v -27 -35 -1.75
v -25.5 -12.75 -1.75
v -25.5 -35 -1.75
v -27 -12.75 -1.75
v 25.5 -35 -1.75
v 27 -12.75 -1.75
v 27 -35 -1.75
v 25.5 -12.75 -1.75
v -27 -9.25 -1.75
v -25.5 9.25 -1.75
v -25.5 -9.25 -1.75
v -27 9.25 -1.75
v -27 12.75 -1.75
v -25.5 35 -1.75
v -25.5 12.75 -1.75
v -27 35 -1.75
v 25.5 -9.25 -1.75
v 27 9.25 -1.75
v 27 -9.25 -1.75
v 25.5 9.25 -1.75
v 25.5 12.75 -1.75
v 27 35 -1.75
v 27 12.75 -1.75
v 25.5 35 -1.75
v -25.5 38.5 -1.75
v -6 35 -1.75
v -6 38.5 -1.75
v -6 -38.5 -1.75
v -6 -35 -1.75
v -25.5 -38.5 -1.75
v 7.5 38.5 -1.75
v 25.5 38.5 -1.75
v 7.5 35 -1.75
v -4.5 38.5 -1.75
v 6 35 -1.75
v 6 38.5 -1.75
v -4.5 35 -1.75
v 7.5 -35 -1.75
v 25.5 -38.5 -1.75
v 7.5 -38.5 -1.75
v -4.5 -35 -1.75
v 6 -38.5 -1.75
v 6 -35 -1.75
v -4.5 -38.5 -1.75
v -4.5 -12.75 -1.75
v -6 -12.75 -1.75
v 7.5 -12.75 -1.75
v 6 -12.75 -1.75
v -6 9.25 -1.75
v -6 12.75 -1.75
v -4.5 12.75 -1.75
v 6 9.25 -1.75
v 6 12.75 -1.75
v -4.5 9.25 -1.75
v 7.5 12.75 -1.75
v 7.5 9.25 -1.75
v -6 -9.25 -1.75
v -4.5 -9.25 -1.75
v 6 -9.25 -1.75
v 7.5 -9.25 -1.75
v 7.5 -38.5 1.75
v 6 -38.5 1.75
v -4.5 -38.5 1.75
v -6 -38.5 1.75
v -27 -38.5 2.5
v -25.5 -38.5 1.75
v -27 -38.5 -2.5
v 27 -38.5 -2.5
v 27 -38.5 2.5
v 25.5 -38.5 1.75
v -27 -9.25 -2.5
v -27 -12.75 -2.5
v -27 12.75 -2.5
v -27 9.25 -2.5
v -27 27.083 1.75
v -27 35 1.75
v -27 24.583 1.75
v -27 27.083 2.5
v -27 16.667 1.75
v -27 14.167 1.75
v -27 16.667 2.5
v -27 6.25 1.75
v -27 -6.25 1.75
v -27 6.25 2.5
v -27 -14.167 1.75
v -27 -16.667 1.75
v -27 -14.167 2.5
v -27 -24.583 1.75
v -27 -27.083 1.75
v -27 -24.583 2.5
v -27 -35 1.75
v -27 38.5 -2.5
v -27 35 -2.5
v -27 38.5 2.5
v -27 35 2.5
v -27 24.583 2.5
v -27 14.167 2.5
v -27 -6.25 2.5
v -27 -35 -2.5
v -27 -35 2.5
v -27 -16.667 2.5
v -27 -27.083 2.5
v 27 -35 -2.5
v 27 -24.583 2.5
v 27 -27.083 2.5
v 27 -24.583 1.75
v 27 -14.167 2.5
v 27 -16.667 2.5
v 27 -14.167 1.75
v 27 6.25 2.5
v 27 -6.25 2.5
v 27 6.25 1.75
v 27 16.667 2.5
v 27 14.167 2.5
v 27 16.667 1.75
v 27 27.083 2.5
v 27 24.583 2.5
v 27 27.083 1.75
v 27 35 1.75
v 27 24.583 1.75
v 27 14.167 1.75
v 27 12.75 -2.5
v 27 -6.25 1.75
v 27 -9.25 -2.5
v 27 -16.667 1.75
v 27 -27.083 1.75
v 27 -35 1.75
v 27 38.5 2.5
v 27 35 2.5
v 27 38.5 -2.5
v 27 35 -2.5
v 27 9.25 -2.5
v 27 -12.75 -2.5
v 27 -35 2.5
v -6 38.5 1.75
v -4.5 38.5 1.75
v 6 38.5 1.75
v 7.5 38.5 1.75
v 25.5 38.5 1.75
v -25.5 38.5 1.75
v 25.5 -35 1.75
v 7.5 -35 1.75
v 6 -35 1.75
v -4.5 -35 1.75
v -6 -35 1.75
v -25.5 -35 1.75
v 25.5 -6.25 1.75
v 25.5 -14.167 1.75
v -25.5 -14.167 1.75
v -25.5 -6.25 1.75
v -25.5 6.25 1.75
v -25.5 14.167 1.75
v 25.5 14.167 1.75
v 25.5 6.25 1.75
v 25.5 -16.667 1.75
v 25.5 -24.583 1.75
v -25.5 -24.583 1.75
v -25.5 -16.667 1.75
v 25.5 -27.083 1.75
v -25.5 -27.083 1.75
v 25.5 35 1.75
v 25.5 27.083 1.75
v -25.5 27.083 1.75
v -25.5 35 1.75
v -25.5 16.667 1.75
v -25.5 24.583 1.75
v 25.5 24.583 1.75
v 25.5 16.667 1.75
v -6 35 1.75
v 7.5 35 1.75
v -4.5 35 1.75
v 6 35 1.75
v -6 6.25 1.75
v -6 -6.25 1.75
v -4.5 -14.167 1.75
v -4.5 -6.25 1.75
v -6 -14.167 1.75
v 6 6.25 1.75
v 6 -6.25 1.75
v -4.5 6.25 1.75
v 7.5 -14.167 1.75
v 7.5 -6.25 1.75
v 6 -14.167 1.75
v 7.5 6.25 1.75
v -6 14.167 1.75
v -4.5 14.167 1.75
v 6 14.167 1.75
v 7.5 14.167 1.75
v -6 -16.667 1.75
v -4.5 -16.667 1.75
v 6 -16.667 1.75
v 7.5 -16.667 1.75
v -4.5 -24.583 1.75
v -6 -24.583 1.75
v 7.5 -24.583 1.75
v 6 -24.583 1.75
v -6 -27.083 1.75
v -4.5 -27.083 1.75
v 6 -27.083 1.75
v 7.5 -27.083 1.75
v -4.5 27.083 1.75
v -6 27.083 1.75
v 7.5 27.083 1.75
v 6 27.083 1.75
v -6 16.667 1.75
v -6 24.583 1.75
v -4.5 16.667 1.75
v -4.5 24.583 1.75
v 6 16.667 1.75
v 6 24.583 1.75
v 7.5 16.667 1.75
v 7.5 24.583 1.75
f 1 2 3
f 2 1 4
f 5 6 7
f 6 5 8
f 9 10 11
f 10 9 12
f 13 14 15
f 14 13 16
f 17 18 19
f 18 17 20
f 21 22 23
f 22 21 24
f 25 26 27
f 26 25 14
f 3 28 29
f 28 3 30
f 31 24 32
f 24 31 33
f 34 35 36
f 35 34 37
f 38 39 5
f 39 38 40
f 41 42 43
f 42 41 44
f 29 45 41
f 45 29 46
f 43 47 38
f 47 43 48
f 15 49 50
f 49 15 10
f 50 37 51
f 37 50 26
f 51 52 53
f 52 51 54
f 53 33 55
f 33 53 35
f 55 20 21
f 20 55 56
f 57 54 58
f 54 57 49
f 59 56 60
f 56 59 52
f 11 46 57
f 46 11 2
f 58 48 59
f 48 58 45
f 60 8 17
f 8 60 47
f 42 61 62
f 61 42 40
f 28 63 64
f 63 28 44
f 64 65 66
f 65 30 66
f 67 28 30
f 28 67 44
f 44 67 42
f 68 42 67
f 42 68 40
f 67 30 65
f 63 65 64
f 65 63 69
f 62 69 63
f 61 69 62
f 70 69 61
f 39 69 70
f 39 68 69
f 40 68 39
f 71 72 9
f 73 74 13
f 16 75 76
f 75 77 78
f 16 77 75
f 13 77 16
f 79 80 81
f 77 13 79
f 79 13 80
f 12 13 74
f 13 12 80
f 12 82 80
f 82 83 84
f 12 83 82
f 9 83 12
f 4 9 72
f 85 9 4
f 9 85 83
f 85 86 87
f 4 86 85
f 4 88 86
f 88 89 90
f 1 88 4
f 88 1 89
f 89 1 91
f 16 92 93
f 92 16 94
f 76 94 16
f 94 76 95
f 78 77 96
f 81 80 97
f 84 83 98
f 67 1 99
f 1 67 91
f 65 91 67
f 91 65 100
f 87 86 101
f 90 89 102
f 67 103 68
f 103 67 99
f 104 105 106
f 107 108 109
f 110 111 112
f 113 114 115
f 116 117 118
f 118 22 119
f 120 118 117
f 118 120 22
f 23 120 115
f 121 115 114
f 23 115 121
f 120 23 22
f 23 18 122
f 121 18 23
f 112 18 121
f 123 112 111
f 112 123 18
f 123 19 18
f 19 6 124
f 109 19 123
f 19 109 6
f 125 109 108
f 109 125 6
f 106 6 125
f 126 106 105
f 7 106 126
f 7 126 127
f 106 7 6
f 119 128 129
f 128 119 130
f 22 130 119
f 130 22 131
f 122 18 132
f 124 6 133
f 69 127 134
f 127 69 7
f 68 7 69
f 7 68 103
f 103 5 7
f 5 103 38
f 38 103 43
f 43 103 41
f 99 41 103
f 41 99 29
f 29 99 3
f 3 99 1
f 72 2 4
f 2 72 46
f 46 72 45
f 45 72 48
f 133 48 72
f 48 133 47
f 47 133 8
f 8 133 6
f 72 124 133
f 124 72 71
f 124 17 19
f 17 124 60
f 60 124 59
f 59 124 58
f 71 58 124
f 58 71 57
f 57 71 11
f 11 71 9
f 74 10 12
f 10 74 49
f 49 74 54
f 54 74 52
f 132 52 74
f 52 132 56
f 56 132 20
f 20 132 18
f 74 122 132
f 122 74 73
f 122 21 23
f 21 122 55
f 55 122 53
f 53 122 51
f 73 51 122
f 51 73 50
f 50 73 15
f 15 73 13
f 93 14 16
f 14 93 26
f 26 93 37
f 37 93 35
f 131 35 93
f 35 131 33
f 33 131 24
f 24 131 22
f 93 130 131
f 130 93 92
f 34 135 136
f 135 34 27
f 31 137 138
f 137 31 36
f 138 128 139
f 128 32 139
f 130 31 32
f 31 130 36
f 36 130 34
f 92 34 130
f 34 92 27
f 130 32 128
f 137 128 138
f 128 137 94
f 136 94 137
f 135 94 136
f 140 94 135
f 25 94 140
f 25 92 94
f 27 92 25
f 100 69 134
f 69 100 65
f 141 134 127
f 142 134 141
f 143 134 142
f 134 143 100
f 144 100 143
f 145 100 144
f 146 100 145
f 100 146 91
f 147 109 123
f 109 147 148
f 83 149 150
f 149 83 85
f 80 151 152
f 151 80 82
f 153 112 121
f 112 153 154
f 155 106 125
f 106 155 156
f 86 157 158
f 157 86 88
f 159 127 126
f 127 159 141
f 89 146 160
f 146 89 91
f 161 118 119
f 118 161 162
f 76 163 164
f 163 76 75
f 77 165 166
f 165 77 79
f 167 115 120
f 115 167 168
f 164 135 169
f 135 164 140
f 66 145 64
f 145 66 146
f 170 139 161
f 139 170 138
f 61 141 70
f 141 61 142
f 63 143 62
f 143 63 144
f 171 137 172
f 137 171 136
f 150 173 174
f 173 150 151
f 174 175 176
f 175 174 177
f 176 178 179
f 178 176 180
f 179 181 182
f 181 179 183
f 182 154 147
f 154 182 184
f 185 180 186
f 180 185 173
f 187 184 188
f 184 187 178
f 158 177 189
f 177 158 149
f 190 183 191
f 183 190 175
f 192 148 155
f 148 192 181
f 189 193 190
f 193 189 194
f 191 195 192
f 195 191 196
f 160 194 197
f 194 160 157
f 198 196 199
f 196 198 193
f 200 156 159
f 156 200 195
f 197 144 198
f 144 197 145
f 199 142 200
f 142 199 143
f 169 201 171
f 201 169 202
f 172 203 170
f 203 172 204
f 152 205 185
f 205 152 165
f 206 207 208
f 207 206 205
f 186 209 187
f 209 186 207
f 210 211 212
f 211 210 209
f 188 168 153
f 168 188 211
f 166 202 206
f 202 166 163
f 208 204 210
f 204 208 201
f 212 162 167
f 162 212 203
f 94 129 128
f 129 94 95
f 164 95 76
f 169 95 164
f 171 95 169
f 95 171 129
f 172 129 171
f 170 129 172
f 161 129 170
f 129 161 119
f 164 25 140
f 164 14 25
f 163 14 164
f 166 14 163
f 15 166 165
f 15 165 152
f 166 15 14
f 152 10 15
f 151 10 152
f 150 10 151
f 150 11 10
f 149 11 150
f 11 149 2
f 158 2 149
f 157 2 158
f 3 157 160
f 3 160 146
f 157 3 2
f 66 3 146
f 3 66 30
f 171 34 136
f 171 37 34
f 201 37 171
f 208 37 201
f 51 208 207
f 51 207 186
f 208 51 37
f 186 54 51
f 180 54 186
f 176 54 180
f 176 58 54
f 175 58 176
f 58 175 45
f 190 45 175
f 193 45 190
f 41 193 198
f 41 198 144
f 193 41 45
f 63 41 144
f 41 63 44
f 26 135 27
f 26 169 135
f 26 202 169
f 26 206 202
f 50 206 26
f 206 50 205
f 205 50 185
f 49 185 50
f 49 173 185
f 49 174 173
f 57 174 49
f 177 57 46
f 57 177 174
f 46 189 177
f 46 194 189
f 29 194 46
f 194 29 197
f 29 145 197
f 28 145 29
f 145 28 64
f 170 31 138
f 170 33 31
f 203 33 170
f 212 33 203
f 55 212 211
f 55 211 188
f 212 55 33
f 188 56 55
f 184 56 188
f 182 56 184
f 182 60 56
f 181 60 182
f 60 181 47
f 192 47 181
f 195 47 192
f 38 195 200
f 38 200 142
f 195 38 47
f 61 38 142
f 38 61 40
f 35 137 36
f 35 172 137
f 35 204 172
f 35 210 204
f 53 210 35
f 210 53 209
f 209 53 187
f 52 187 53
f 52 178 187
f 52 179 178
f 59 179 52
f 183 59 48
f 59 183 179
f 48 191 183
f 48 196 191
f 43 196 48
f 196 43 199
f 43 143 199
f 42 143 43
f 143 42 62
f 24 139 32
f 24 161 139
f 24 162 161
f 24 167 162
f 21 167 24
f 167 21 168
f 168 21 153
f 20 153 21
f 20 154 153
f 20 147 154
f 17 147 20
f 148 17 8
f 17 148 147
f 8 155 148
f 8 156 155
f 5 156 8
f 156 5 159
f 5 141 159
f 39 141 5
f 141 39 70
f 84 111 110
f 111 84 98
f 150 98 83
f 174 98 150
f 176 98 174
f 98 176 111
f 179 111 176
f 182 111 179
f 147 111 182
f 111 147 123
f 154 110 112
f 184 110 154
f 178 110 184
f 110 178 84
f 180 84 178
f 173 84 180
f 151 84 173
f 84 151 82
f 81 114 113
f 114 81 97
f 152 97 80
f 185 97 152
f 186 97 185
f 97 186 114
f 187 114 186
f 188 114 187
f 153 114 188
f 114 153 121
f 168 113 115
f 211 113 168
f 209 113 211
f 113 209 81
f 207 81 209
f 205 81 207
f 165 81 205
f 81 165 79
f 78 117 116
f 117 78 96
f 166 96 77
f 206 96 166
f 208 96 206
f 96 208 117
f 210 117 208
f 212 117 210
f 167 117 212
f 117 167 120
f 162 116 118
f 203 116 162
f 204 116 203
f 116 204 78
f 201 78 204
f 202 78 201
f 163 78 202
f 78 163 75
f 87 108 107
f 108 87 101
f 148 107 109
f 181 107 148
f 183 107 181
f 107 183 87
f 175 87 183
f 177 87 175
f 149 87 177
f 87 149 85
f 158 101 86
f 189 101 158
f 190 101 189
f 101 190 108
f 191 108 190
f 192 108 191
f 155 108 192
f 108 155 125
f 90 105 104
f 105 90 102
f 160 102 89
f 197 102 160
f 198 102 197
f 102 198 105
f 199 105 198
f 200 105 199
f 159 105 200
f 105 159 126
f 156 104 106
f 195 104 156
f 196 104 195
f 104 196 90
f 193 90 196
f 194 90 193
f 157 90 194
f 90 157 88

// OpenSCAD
// file: materials.scad
// General Materials List for part Dimmentions
//  These form the matrial requirements for Deseret Manufacturing's homemade pallets

// Define Rails as 2x4 boards
Rails_W = 3.5; // 4
Rails_T = 1.5; // 2

// Define Frames as 1x4 boards
Frame_W = 3.5; // 4
Frame_T = 0.75; // 1

// Define Ties as 1x3 boards
Tie_W = 2.5; // 3
Tie_T = Frame_T; // same thickness as Frames

// These are the real sizes of the board and are used in calulations and rendering
// file: Pallet.scad
// Generic Pallet Module

include <materials.scad>

module Pallet(length, width, center) {
	// Define parts
	Rails = [Rails_W, length, Rails_T];
	Frame = [Frame_W, width, Frame_T];
	Tie = [Tie_W, width, Frame_T];

	// Place Foundation
	//  The end-to-end constant 29.25 is used because in the pallets I have made I can find no edge-cases that would need to alter it and I lack sufficient data on pallet jacks to automaticly place them.
	foundation_pos = [0, 29.25 - Frame_W, length - 29.25, length - Frame_W];

	for( pos = foundation_pos ) {
		rotate([0,0,90]) translate([pos - length / 2, - width / 2, - (Rails_W / 2) - Frame_T]) cube(Frame);
	}

	for( pos = [0, length - Frame_W] ) {
		rotate([0,0,90]) translate([pos - length / 2, - width / 2, Rails_W /2]) cube(Frame);
	}

	// Place Rails
	//  The end-to-end constant for the space between the two middle rails is 13.5
	//  Again I lack sufficient data on pallet jacks to automaticly place them.
	
	rail_spaces = (width - 13.5 + Rails_T) / 2;

	rail_pos = [0, rail_spaces, width - rail_spaces, width - Rails_T];

	for( pos = rail_pos ) {
		translate([pos - width /2 , -length /2 ,Rails_W /2]) rotate([0,90,0]) cube(Rails);
	}

	// Place Ties
	//  Ties form the main face of the pallet
   //  In this design, a centeral cluster of ties is used to reinforce the middle of the pallet
	pallet_center = length / 2;
	cluster_center = (center * Tie_W) / 2 + Tie_W;
	function cluster_pos_gen(ittr) = pallet_center - cluster_center + (ittr * Tie_W);
	cluster_pos = [ for(i=[1:center]) cluster_pos_gen(i) ];
    for( pos = cluster_pos ){
        rotate([0,0,90]) translate([pos - length / 2, - width / 2, Rails_W /2]) cube(Tie);
    }
    
    target_space = 8;
    tie_count = ceil((length - ( center * Tie_W + 2 * ( Frame_W + target_space ))) / (Tie_W + target_space ) / 2) * 2;
    tie_space = (length - ( center * Tie_W + 2 * Frame_W + tie_count * Tie_W )) / (tie_count + 2);
    echo(tie_count);
    echo(tie_space);
    for(i = [0:tie_count / 2 - 1] ) {
        rotate([0,0,90]) translate([i * (tie_space + Tie_W) + (center * Tie_W) / 2 + tie_space, - width / 2, Rails_W /2]) cube(Tie);
    }
     for(i = [0:tie_count / 2 - 1] ) {
        rotate([0,0,90]) translate([-(i * (tie_space + Tie_W) + (center * Tie_W) / 2 + tie_space) - Tie_W, - width / 2, Rails_W /2]) cube(Tie);
    }
}
// main file
// Implimentation of full sized pallets (designed to fit a full sized mattress).

use <Pallet.scad>

Pallet_L = 77;
Pallet_W = 54;
Center = 5;

Pallet(Pallet_L, Pallet_W, Center);
